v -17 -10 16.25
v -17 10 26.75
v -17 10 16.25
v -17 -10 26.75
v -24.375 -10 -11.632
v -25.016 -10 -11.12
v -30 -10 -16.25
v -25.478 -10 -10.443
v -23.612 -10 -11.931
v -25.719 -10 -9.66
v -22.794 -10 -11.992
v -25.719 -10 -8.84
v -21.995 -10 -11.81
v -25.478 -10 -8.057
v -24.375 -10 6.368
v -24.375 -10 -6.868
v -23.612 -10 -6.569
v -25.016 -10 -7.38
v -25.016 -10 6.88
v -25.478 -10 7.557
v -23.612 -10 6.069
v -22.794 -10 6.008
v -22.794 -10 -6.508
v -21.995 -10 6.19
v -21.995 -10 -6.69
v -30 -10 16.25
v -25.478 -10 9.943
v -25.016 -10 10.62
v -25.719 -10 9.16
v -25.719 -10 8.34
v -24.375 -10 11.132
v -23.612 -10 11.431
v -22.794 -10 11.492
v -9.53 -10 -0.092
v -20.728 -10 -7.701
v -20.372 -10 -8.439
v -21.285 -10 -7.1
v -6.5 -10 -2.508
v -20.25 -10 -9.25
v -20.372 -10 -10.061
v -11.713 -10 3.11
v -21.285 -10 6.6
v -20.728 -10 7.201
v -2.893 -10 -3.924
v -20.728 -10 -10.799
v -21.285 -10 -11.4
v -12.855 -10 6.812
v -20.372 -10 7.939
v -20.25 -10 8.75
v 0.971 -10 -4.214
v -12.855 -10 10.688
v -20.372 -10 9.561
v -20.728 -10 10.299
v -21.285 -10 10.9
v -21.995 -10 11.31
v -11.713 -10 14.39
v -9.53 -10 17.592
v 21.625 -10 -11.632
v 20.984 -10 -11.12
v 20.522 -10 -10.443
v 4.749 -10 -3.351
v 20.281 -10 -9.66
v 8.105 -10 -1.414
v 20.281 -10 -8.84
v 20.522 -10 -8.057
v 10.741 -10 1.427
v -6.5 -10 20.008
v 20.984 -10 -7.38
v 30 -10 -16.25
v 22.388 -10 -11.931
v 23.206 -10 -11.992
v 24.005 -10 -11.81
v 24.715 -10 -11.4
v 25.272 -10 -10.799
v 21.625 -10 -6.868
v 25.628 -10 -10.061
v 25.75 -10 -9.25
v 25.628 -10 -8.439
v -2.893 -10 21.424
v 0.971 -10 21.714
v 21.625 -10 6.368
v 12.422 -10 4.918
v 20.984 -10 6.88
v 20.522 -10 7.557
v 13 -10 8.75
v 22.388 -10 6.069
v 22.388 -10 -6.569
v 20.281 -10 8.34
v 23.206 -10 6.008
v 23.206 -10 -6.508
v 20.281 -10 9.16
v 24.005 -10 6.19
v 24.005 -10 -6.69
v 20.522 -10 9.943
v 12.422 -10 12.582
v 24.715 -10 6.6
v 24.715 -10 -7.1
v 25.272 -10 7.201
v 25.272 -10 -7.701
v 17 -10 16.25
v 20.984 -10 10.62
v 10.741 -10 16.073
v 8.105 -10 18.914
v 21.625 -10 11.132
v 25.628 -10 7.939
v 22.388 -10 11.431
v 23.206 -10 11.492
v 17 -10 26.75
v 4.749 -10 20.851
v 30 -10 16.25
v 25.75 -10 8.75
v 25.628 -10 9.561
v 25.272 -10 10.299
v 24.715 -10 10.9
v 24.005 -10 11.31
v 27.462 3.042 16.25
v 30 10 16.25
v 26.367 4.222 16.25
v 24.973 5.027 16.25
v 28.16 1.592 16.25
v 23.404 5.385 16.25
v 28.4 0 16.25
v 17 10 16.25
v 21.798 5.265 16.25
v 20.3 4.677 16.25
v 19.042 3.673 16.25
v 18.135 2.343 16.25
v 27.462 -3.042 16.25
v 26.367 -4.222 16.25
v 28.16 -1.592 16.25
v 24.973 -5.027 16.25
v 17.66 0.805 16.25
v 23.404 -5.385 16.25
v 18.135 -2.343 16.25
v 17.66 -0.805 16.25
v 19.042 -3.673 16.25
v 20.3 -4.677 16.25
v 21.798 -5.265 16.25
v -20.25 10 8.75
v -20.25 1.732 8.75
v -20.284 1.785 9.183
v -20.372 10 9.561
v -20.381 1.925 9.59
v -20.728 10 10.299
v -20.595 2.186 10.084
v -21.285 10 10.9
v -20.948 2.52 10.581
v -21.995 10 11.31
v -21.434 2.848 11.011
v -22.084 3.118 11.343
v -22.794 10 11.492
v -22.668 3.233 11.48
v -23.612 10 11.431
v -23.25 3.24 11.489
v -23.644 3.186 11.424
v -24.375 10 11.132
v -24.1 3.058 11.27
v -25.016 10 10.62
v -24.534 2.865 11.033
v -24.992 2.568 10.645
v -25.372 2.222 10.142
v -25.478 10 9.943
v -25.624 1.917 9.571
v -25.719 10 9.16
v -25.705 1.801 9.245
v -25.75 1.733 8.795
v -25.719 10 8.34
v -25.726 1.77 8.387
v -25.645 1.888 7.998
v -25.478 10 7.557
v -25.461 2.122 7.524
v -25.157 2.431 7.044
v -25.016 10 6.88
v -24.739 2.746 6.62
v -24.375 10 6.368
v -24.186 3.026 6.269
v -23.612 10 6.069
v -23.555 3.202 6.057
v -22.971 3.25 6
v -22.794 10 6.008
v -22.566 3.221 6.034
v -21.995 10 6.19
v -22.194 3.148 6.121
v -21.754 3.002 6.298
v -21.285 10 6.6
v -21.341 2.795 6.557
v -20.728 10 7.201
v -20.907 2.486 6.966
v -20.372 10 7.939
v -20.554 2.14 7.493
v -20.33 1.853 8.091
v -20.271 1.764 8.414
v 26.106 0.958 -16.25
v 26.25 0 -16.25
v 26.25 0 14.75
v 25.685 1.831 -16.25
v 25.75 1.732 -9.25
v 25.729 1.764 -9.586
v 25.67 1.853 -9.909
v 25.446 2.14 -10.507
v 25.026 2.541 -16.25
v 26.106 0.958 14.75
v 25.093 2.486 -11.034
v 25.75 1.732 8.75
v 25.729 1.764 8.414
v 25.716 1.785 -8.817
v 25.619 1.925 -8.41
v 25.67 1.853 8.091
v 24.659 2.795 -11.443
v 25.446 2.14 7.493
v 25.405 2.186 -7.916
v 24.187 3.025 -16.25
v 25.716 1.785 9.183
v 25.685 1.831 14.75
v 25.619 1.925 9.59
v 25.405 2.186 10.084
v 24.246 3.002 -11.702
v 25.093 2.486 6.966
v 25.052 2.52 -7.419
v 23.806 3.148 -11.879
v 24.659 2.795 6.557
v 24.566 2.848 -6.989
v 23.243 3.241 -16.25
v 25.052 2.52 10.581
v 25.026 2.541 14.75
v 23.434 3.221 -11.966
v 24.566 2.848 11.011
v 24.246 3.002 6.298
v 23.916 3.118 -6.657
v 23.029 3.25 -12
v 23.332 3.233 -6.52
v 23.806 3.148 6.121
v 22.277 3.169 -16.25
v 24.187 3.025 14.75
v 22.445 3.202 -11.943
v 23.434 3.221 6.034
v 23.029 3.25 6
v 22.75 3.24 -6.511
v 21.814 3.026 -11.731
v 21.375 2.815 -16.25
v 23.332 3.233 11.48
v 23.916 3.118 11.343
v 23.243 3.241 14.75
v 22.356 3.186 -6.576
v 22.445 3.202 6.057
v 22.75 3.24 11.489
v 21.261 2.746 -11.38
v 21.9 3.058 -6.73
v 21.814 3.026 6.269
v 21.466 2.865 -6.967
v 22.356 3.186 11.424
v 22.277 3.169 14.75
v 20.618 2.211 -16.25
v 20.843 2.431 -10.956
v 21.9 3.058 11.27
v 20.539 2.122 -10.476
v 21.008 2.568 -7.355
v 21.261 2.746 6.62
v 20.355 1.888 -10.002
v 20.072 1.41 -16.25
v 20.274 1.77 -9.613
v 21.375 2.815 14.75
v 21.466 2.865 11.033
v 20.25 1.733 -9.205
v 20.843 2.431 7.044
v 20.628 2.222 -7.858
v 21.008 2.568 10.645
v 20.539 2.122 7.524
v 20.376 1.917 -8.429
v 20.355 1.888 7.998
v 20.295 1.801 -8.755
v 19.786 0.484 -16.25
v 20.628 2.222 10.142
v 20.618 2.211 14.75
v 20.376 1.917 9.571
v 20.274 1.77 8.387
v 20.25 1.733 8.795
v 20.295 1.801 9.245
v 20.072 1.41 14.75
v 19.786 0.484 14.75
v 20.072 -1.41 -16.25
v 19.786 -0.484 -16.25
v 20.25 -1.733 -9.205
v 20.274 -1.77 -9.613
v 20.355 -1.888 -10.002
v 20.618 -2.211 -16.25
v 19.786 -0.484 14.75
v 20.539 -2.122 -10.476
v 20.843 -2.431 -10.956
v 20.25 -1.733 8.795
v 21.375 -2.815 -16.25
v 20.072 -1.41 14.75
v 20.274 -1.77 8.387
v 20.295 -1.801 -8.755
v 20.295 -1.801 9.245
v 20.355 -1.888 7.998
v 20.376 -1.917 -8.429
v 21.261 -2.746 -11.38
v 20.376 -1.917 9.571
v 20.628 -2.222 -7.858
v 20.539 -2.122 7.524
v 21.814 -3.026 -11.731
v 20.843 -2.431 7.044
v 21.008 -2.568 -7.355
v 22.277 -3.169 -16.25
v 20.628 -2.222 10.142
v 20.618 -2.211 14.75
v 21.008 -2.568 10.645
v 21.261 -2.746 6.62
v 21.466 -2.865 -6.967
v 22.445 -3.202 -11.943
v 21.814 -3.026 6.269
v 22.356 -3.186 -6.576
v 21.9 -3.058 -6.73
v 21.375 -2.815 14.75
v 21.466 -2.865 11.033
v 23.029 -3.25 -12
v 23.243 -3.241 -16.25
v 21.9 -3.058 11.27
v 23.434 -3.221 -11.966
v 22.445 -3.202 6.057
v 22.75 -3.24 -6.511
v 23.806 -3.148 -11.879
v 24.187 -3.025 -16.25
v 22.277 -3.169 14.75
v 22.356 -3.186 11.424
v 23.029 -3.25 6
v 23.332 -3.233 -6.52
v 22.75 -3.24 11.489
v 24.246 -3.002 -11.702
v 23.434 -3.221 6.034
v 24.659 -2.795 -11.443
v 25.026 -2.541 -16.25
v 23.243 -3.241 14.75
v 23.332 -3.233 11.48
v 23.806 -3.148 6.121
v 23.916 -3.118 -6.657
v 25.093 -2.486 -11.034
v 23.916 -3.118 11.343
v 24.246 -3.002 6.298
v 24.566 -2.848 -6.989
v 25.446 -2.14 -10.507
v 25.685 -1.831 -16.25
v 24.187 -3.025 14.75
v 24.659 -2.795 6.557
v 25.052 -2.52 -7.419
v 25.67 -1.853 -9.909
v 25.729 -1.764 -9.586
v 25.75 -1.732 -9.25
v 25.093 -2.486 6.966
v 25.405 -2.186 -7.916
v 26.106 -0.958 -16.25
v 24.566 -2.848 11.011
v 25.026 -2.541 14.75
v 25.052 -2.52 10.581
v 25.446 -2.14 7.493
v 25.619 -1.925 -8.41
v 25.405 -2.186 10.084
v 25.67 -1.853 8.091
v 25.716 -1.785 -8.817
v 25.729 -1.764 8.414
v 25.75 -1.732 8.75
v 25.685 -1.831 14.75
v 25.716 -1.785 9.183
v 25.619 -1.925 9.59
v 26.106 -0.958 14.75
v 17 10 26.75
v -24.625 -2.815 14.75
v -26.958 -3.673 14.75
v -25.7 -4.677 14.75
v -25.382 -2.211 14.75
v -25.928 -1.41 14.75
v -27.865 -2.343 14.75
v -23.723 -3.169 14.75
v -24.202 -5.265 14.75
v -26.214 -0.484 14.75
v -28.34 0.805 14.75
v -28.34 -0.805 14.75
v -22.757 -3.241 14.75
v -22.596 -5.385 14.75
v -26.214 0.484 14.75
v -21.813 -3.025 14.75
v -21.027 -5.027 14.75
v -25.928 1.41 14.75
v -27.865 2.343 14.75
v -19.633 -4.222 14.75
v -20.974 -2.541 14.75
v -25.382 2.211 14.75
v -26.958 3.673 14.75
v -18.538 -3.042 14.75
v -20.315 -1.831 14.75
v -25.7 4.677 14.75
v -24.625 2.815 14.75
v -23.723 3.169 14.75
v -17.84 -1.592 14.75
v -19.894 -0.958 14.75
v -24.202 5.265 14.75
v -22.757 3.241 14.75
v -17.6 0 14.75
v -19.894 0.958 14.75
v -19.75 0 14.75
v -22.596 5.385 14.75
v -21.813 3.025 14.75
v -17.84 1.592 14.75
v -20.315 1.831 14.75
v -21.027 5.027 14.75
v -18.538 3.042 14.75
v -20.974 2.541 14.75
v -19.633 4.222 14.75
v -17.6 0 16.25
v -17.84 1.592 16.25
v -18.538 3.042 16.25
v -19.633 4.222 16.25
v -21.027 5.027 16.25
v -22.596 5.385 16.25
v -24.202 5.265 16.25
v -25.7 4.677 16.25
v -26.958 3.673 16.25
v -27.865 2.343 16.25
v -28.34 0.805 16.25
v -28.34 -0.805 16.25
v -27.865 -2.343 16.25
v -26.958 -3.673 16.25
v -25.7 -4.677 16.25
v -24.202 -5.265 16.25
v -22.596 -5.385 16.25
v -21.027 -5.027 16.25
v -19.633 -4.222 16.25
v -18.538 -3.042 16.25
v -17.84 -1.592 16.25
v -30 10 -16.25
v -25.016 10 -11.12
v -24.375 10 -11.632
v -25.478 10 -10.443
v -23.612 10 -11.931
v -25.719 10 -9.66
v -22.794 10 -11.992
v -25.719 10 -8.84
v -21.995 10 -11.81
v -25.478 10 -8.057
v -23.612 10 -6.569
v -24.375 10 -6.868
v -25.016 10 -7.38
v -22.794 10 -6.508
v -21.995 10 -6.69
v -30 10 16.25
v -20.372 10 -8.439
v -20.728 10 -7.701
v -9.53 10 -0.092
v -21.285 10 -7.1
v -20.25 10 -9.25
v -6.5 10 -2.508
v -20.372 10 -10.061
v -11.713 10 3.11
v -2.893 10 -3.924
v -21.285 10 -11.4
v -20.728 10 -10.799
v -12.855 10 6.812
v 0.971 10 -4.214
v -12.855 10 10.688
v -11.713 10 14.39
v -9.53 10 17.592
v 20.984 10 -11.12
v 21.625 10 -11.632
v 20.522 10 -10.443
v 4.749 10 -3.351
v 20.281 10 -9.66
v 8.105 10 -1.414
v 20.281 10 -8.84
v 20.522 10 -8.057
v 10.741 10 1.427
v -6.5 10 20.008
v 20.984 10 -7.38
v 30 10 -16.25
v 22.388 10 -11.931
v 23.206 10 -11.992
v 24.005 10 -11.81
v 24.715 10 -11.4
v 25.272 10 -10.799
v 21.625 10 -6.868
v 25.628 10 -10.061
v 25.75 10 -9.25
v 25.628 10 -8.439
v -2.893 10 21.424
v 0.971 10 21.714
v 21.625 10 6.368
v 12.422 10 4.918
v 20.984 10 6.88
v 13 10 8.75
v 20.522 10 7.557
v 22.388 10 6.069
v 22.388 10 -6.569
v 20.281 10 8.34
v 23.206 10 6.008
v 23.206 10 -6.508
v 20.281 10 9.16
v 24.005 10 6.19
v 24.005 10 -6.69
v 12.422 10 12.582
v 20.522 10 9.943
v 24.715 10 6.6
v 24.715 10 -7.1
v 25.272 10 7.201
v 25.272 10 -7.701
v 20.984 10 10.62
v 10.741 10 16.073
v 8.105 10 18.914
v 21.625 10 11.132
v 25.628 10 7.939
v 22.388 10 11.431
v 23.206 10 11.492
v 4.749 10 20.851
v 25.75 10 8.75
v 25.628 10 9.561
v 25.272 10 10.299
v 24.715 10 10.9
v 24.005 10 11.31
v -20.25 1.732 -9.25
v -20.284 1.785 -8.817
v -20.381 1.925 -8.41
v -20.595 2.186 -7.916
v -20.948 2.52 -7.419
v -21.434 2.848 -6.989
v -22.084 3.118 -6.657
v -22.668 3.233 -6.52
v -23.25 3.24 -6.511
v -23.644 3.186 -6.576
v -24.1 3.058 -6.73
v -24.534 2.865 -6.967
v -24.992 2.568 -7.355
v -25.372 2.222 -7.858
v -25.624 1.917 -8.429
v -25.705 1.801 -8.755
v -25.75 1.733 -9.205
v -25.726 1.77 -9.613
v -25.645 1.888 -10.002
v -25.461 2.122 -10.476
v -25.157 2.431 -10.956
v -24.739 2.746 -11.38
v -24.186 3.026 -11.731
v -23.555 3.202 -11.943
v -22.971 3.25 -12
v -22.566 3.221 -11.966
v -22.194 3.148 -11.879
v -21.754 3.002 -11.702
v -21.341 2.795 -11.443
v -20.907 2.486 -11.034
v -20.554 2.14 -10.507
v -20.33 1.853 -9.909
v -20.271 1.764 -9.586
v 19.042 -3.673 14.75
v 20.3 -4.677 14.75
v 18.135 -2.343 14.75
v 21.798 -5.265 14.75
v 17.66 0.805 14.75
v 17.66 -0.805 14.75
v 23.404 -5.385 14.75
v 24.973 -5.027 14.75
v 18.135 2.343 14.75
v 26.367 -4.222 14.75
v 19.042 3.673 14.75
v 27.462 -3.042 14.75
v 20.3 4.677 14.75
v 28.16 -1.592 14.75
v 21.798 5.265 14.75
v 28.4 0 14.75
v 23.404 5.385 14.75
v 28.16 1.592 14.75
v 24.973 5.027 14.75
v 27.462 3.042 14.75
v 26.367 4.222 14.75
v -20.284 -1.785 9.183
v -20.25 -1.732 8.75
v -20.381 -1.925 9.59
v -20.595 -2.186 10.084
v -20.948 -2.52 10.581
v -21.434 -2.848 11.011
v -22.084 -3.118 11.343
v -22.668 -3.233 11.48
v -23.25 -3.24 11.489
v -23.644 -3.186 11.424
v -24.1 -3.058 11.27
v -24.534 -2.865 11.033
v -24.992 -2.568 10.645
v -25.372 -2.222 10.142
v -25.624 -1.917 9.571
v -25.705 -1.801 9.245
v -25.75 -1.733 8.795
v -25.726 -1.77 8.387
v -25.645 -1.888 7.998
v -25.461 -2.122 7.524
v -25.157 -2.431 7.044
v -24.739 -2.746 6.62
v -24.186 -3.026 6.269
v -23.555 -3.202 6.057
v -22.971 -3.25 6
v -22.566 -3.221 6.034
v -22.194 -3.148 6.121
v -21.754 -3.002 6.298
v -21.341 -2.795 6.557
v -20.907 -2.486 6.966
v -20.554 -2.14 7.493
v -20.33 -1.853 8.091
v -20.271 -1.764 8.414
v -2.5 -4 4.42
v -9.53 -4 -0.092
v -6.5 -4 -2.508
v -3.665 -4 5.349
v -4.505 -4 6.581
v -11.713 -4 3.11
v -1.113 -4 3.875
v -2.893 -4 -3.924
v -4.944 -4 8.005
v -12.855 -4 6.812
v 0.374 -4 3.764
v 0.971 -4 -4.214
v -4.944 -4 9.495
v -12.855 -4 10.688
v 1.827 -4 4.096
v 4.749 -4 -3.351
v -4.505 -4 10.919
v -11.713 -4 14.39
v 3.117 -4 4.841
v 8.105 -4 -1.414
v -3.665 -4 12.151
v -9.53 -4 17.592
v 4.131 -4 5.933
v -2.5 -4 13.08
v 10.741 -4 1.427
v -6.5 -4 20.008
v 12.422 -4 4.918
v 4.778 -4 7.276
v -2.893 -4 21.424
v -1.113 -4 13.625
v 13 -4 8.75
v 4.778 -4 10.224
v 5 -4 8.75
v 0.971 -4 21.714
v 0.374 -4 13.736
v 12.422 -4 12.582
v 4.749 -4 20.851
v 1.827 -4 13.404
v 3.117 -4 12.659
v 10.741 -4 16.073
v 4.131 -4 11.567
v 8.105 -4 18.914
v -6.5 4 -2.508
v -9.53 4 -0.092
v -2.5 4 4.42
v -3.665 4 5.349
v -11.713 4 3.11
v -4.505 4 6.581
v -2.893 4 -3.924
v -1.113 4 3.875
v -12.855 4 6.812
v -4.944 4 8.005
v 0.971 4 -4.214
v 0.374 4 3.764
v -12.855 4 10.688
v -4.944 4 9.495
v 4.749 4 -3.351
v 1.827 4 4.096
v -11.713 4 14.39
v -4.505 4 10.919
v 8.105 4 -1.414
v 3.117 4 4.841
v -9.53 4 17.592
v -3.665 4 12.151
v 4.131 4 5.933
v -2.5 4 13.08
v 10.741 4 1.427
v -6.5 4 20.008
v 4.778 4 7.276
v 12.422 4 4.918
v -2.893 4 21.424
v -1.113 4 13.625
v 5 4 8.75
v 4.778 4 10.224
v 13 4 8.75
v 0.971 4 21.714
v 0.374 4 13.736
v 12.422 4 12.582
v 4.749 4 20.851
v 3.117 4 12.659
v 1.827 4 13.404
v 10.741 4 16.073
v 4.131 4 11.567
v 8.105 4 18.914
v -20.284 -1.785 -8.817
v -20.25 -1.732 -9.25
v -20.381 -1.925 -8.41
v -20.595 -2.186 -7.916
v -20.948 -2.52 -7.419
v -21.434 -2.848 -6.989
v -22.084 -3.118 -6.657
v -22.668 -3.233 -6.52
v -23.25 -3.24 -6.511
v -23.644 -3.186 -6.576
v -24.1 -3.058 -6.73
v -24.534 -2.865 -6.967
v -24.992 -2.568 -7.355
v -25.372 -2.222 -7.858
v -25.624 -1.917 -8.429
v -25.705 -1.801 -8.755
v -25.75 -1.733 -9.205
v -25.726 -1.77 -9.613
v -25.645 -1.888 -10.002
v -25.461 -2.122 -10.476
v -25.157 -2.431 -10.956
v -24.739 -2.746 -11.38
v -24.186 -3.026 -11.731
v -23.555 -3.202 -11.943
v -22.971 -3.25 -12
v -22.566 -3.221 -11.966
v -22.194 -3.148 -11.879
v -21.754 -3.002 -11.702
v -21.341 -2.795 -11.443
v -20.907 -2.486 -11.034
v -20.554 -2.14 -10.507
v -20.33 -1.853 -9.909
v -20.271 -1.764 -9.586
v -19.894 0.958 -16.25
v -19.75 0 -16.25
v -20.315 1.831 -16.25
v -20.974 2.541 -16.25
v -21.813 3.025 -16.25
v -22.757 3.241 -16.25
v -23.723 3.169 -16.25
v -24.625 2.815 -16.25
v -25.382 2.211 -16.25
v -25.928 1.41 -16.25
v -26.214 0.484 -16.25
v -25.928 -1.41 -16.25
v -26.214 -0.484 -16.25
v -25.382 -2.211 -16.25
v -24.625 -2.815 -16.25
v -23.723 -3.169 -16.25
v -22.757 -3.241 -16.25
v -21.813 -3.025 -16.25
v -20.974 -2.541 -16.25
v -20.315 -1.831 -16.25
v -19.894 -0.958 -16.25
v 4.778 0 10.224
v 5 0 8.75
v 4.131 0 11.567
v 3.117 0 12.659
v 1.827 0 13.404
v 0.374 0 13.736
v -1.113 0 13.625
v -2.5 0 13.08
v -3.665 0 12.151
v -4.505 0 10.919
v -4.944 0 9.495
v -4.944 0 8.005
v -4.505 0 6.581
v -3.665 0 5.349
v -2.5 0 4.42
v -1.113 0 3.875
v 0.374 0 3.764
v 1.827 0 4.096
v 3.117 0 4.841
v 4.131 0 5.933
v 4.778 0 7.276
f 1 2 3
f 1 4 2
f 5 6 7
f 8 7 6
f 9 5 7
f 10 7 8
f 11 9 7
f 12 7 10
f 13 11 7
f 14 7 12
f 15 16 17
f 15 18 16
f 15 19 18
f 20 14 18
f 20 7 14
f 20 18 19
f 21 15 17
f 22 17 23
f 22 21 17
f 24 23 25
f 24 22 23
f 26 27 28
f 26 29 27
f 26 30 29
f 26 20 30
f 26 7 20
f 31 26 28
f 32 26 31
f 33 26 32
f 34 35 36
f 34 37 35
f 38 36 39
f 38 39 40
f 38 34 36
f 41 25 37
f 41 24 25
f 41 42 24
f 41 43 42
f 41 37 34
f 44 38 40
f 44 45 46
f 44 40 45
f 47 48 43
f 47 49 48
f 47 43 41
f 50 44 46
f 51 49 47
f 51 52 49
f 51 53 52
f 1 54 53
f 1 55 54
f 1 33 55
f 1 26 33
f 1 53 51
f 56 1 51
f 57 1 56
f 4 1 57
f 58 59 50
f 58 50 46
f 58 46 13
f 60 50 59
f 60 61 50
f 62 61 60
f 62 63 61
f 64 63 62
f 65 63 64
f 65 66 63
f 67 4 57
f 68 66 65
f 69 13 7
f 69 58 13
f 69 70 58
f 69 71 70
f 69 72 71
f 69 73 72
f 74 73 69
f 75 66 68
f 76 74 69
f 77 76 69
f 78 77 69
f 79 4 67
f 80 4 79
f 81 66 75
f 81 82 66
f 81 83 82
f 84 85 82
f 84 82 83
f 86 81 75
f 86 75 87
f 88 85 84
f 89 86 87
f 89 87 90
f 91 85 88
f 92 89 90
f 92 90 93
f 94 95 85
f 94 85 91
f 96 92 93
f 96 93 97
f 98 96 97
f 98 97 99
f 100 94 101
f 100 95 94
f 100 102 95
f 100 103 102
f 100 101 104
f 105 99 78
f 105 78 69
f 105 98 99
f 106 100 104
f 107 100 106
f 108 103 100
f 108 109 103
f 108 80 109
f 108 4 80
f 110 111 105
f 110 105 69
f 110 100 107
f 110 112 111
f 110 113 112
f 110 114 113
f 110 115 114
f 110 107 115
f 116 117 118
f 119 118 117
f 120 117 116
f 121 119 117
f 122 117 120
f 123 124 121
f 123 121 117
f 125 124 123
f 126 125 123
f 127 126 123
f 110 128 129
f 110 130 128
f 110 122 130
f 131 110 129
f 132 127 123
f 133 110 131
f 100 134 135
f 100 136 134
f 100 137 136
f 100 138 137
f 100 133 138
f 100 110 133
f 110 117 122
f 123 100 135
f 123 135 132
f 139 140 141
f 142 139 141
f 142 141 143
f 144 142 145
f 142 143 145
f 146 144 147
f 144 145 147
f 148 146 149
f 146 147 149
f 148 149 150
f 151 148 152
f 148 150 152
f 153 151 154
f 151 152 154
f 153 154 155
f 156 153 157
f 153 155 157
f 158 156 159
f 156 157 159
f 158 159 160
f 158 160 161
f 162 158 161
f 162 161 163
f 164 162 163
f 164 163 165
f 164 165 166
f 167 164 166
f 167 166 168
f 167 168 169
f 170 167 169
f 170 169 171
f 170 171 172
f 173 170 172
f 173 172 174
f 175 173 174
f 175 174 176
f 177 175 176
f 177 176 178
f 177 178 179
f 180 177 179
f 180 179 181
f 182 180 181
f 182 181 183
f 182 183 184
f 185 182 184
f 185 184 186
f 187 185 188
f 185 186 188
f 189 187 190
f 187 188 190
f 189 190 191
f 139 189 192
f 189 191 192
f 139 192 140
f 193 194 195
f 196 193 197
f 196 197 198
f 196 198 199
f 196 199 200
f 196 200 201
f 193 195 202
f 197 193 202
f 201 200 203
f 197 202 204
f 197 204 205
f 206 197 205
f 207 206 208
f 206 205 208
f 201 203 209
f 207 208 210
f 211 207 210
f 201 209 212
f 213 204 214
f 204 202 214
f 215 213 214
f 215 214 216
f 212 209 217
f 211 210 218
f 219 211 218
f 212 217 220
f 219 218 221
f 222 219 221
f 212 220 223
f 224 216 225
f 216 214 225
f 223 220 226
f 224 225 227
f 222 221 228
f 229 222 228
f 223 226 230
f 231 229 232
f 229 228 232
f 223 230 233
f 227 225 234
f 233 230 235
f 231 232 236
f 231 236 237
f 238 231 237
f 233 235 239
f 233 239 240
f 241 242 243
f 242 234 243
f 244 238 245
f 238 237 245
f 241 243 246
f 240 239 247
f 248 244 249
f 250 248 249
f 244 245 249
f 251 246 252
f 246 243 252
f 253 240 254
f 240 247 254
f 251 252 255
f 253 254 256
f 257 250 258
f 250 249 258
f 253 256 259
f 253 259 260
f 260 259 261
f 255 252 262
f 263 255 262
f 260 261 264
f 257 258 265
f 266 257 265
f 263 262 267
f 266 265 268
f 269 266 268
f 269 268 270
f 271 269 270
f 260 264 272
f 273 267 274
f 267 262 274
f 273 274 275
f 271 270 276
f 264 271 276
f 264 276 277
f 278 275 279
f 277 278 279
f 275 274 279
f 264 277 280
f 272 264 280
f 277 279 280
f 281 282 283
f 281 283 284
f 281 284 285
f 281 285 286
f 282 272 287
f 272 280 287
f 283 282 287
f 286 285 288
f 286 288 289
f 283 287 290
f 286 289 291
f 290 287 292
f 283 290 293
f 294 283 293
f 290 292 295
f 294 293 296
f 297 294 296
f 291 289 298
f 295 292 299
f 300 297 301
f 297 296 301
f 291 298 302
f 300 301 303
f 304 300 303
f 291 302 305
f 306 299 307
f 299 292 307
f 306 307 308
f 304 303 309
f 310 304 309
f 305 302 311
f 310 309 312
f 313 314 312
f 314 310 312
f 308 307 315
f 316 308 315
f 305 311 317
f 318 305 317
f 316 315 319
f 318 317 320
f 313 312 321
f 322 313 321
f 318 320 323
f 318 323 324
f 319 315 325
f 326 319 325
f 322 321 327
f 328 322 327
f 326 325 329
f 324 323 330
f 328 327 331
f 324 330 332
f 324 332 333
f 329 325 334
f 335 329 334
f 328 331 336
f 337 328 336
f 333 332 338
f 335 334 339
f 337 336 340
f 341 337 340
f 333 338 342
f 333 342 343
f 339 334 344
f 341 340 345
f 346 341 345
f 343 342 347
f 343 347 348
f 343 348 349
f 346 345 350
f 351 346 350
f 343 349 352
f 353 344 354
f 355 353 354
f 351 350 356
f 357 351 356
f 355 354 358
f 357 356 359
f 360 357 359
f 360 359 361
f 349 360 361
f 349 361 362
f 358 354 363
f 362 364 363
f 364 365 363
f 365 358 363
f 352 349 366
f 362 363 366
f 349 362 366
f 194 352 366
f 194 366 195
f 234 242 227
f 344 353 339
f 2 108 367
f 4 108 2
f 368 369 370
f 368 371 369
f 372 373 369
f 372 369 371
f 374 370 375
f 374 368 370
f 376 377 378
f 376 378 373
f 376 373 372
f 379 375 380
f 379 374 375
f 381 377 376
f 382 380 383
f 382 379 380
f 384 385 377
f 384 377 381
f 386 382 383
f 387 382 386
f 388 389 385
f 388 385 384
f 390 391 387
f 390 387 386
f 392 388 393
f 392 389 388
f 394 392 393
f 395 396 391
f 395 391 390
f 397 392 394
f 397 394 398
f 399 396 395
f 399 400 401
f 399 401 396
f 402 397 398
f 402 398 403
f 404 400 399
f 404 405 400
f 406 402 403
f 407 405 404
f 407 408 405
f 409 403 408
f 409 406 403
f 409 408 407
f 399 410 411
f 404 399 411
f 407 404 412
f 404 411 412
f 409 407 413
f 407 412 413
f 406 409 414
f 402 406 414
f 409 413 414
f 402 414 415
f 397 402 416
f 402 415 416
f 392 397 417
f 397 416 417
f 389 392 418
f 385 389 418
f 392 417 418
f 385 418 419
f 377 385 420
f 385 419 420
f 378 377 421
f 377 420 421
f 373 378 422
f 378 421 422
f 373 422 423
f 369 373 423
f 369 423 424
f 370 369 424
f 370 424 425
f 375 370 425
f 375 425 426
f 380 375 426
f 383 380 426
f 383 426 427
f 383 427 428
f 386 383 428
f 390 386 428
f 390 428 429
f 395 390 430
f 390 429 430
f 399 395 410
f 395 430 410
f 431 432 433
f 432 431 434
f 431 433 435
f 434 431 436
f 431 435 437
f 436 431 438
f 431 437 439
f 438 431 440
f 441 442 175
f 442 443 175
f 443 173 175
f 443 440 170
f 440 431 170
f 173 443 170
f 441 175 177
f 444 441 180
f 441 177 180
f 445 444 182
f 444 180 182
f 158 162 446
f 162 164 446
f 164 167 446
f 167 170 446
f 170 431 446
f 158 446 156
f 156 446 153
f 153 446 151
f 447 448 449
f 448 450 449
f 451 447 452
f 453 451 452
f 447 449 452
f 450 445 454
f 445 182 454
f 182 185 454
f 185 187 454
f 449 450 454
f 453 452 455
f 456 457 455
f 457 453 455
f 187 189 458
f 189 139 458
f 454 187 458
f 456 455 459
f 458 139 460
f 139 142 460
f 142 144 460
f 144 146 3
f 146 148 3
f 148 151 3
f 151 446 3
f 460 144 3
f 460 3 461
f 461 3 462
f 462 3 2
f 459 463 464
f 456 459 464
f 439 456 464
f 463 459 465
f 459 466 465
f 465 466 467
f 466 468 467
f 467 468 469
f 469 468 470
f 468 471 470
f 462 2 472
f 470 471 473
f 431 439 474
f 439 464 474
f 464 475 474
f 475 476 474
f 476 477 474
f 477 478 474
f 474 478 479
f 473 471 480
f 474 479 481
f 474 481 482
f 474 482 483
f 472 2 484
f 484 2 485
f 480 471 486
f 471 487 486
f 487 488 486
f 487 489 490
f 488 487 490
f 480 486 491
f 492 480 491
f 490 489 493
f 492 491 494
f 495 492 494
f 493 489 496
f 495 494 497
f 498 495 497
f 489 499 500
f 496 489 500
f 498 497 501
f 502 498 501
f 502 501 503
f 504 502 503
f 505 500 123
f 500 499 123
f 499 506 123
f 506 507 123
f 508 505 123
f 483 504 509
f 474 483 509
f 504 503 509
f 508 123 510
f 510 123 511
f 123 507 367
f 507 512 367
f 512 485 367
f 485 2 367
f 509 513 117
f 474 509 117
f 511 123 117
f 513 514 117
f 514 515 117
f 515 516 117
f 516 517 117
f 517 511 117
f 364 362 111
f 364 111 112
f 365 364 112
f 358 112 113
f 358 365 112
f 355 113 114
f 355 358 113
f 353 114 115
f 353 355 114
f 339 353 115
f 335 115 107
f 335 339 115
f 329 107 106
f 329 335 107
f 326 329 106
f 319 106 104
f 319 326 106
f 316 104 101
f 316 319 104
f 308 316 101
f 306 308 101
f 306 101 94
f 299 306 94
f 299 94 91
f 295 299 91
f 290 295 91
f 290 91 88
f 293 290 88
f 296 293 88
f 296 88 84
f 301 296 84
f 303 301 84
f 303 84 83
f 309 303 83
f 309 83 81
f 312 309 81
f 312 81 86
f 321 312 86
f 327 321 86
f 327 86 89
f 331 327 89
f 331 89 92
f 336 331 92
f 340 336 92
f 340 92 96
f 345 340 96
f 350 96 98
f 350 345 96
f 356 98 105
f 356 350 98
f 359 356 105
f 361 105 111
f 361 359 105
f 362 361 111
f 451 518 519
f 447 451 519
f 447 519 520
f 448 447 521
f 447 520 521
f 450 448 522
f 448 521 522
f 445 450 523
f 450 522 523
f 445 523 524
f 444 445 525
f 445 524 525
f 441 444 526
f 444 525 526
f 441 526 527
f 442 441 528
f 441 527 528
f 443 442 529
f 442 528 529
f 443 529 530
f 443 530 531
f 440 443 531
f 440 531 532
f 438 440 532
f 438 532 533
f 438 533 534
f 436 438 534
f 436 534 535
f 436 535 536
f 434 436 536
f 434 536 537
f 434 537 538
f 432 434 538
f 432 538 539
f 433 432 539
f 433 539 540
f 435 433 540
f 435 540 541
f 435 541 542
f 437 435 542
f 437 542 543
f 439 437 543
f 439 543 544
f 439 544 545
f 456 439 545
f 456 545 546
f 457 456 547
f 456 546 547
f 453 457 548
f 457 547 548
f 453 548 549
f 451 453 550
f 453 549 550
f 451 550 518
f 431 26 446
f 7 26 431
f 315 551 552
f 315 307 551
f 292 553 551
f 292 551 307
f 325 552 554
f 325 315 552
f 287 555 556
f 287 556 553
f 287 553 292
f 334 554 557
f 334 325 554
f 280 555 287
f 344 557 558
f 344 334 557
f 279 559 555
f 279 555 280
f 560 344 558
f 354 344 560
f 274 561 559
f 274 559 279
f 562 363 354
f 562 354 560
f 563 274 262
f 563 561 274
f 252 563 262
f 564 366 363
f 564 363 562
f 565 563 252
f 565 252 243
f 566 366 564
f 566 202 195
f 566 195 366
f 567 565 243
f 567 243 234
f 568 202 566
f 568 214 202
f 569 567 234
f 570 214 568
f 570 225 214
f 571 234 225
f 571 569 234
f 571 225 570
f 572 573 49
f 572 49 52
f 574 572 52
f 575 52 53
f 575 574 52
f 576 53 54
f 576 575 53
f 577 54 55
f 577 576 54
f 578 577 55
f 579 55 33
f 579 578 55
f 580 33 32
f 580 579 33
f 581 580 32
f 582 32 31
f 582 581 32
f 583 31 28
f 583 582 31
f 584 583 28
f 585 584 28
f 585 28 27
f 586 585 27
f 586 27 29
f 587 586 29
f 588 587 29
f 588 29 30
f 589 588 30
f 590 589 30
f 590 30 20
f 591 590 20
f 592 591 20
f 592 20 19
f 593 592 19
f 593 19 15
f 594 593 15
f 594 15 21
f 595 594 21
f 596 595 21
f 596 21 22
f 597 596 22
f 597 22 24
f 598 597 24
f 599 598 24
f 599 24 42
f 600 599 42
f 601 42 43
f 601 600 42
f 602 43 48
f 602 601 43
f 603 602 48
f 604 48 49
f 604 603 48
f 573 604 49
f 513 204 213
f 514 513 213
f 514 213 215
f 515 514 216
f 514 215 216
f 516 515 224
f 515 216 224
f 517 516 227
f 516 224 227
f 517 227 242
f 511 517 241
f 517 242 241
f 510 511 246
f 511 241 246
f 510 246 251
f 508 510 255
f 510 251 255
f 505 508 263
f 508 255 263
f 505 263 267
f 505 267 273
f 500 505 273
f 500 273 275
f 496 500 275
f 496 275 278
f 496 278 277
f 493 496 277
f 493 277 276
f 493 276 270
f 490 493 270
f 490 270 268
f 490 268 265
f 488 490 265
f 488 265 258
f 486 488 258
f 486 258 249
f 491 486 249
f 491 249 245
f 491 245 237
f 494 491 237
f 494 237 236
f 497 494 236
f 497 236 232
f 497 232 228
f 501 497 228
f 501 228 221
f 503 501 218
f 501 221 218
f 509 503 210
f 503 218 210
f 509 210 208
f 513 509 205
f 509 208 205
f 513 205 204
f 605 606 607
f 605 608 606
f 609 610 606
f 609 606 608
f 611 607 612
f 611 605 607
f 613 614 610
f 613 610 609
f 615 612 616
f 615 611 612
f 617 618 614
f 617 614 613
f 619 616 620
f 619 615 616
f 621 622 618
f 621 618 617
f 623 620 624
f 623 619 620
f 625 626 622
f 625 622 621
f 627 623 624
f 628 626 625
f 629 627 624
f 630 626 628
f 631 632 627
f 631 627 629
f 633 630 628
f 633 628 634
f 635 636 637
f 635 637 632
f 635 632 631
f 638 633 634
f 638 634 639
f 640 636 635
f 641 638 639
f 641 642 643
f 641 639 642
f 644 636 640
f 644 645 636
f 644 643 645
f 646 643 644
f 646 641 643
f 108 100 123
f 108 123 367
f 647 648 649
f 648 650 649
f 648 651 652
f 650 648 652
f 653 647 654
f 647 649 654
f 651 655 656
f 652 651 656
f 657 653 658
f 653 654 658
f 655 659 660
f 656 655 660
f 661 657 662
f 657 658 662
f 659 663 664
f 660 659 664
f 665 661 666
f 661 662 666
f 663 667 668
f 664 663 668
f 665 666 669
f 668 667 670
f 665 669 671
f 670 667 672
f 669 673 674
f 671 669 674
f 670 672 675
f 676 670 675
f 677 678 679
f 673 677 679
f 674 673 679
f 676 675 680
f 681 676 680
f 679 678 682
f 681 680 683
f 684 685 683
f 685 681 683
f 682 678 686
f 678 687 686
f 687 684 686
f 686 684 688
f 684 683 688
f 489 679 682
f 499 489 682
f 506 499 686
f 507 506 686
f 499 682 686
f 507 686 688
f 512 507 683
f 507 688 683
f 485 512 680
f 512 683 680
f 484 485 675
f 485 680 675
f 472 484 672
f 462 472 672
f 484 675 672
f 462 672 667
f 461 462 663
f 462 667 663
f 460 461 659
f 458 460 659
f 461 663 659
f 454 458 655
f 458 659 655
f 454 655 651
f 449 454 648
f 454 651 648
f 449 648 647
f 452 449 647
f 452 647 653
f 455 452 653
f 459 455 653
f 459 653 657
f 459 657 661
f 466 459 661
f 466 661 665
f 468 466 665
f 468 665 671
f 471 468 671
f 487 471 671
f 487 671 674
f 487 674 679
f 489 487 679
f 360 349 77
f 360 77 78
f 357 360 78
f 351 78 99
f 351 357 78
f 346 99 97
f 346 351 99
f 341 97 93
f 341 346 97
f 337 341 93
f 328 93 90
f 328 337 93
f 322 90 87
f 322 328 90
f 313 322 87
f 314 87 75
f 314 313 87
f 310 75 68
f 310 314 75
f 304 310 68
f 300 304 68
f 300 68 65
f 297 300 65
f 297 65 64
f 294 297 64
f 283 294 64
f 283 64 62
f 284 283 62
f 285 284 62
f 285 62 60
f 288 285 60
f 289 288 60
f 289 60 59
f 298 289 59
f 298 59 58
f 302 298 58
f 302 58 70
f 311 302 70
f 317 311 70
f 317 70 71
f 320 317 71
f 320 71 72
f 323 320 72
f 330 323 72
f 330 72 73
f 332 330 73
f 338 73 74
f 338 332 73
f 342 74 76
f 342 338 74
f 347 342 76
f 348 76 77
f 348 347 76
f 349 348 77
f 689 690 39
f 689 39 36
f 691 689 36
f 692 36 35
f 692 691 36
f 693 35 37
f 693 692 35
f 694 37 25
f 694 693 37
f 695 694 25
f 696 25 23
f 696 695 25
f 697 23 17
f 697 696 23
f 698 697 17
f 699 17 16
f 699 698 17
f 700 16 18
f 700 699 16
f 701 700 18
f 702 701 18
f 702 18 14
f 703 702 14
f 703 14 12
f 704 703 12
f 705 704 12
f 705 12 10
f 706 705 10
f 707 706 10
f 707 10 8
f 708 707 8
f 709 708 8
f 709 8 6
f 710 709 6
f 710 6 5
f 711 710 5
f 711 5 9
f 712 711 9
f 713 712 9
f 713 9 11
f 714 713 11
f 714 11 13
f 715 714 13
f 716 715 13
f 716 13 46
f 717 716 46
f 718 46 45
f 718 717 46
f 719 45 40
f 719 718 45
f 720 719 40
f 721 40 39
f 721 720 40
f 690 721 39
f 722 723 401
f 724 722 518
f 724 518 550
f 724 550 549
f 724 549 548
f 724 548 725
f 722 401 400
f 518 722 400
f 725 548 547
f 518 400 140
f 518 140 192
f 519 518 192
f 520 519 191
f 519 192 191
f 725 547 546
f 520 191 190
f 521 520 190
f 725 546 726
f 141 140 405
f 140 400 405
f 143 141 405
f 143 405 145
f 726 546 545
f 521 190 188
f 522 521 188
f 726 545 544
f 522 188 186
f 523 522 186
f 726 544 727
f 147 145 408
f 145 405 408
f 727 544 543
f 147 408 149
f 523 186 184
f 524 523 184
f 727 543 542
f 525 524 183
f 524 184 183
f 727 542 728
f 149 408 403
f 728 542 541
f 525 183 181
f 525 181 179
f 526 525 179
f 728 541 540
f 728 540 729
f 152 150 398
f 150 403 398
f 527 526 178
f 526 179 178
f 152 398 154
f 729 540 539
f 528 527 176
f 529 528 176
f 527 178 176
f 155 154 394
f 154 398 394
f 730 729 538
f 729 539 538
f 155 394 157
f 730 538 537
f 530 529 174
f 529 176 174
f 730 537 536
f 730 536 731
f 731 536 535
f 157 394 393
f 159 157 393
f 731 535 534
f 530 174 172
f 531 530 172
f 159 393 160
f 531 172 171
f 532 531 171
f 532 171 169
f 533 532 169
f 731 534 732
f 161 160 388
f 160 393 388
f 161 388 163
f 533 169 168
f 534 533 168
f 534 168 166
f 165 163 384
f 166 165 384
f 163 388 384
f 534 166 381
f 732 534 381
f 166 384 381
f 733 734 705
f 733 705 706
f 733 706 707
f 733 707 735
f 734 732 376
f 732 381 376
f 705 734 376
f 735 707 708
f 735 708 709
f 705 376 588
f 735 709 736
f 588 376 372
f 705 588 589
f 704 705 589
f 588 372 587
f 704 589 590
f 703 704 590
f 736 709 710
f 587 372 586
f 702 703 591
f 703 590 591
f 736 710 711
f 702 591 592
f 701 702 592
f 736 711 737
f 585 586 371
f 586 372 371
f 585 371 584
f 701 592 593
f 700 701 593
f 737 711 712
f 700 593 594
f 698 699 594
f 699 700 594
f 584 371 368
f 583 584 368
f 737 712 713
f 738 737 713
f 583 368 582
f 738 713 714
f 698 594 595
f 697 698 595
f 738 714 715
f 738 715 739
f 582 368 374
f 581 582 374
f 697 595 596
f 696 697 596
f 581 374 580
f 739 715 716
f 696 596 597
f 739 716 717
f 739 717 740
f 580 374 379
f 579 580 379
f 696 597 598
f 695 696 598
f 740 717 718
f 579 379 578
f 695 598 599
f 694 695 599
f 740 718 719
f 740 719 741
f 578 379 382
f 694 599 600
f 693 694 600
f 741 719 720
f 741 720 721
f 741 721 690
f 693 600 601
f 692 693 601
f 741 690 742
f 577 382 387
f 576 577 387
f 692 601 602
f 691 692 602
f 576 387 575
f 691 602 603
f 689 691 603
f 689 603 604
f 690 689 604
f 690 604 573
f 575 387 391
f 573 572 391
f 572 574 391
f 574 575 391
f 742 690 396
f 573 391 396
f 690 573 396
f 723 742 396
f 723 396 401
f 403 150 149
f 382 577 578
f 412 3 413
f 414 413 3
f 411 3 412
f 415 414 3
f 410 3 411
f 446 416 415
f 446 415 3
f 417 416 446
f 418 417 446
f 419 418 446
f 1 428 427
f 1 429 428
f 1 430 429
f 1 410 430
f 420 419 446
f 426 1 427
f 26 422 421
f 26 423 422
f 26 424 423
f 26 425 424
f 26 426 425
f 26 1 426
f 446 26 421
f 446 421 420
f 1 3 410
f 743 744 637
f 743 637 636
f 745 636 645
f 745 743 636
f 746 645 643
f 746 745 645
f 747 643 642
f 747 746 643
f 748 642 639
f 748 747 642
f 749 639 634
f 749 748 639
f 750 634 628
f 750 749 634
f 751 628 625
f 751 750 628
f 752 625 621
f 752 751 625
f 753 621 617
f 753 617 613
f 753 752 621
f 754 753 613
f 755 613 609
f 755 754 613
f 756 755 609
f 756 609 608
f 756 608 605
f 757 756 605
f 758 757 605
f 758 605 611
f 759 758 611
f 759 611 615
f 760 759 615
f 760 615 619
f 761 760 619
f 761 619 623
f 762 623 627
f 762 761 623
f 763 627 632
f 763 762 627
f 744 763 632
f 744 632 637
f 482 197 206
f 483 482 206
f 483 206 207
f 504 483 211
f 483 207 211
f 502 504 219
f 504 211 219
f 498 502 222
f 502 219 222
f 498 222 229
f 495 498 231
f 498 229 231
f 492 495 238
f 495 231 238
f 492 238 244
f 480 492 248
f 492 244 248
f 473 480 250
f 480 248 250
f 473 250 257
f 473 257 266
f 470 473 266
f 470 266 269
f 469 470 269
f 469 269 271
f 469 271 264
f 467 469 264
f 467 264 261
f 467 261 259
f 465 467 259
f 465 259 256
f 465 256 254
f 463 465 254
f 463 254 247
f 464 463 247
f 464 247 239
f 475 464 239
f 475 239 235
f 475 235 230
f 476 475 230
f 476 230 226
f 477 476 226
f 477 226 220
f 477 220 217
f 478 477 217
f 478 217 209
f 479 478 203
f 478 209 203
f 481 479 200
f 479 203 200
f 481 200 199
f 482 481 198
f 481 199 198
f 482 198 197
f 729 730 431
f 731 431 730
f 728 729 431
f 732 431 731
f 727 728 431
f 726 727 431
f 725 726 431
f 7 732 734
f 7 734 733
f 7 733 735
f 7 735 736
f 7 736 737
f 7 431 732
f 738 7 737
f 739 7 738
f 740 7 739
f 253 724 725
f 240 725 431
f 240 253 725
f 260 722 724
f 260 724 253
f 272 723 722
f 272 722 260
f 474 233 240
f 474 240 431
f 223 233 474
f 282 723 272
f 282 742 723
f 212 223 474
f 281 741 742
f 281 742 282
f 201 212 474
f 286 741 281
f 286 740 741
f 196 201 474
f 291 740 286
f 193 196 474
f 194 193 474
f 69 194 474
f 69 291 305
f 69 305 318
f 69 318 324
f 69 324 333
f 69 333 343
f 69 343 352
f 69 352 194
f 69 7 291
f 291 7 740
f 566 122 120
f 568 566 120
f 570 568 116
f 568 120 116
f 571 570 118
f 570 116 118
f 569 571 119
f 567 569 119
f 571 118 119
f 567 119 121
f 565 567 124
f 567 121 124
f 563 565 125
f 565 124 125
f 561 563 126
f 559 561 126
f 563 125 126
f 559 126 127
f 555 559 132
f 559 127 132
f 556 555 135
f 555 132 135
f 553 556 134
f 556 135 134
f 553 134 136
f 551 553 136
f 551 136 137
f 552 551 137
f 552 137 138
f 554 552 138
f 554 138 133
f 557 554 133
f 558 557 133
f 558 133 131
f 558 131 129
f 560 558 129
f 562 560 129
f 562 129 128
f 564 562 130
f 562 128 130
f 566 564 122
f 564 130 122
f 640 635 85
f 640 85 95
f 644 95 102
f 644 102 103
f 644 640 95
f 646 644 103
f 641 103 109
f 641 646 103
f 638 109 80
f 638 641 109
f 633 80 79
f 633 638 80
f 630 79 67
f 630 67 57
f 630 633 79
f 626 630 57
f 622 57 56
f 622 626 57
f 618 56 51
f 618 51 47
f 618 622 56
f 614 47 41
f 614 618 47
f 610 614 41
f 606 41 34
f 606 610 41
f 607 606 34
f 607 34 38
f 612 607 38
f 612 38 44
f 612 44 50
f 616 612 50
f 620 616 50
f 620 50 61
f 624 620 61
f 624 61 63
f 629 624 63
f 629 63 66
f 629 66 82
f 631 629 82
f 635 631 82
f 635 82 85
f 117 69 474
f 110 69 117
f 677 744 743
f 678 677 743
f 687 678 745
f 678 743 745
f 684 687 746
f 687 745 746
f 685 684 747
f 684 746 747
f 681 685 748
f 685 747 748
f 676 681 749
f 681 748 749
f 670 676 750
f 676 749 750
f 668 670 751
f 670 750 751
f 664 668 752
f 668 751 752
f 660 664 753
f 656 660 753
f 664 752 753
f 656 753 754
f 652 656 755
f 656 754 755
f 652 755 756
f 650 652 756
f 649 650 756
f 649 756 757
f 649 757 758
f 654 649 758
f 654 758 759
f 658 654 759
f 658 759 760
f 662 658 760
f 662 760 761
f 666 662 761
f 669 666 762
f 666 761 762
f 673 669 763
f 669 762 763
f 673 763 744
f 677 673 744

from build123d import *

# Parameters (mm, degrees)
F0_R          = 2.75
F0_R_2        = 13
F1_DEPTH      = 10
F1_DEPTH_BACK = 10
F2_R          = 13
F2_R_2        = 5
F3_DEPTH      = 4
F3_DEPTH_BACK = 4
F4_R          = 3.25
F5_DEPTH      = 32.501
F6_R          = 5.4
F7_DEPTH      = 1.5


with BuildPart() as f1:
    # F0 (on Front) → F1 (new body, two sides)
    with BuildSketch(Plane.XZ) as f1_sk:
        Polygon((-30, -16.25), (30, -16.25), (30, 16.25), (17, 16.25), (17, 26.75), (-17, 26.75), (-17, 16.25), (-30, 16.25), align=None)
        with Locations((-23, -9.25)):
            Circle(F0_R, mode=Mode.SUBTRACT)
        with Locations((23, -9.25)):
            Circle(F0_R, mode=Mode.SUBTRACT)
        with Locations((-23, 8.75)):
            Circle(F0_R, mode=Mode.SUBTRACT)
        with Locations((0, 8.75)):
            Circle(F0_R_2, mode=Mode.SUBTRACT)
        with Locations((23, 8.75)):
            Circle(F0_R, mode=Mode.SUBTRACT)
    extrude(amount=F1_DEPTH)
    extrude(f1_sk.sketch, amount=-F1_DEPTH_BACK)

    # F2 (on Front) → F3 (join, two sides)
    with BuildSketch(Plane.XZ) as f3_sk:
        with Locations((0, 8.75)):
            Circle(F2_R)
        with Locations((0, 8.75)):
            Circle(F2_R_2, mode=Mode.SUBTRACT)
    extrude(amount=F3_DEPTH)
    extrude(f3_sk.sketch, amount=-F3_DEPTH_BACK)

    # F4 (on face) → F5 (cut, through all)
    with BuildSketch(Plane.XY.offset(16.25)):
        with Locations((-23, 0)):
            Circle(F4_R)
        with Locations((23, 0)):
            Circle(F4_R)
    extrude(amount=-F5_DEPTH, mode=Mode.SUBTRACT)

    # F6 (on face) → F7 (cut)
    with BuildSketch(Plane.XY.offset(16.25)):
        with Locations((-23, 0)):
            Circle(F6_R)
        with Locations((23, 0)):
            Circle(F6_R)
    extrude(amount=-F7_DEPTH, mode=Mode.SUBTRACT)


solid = f1.part
